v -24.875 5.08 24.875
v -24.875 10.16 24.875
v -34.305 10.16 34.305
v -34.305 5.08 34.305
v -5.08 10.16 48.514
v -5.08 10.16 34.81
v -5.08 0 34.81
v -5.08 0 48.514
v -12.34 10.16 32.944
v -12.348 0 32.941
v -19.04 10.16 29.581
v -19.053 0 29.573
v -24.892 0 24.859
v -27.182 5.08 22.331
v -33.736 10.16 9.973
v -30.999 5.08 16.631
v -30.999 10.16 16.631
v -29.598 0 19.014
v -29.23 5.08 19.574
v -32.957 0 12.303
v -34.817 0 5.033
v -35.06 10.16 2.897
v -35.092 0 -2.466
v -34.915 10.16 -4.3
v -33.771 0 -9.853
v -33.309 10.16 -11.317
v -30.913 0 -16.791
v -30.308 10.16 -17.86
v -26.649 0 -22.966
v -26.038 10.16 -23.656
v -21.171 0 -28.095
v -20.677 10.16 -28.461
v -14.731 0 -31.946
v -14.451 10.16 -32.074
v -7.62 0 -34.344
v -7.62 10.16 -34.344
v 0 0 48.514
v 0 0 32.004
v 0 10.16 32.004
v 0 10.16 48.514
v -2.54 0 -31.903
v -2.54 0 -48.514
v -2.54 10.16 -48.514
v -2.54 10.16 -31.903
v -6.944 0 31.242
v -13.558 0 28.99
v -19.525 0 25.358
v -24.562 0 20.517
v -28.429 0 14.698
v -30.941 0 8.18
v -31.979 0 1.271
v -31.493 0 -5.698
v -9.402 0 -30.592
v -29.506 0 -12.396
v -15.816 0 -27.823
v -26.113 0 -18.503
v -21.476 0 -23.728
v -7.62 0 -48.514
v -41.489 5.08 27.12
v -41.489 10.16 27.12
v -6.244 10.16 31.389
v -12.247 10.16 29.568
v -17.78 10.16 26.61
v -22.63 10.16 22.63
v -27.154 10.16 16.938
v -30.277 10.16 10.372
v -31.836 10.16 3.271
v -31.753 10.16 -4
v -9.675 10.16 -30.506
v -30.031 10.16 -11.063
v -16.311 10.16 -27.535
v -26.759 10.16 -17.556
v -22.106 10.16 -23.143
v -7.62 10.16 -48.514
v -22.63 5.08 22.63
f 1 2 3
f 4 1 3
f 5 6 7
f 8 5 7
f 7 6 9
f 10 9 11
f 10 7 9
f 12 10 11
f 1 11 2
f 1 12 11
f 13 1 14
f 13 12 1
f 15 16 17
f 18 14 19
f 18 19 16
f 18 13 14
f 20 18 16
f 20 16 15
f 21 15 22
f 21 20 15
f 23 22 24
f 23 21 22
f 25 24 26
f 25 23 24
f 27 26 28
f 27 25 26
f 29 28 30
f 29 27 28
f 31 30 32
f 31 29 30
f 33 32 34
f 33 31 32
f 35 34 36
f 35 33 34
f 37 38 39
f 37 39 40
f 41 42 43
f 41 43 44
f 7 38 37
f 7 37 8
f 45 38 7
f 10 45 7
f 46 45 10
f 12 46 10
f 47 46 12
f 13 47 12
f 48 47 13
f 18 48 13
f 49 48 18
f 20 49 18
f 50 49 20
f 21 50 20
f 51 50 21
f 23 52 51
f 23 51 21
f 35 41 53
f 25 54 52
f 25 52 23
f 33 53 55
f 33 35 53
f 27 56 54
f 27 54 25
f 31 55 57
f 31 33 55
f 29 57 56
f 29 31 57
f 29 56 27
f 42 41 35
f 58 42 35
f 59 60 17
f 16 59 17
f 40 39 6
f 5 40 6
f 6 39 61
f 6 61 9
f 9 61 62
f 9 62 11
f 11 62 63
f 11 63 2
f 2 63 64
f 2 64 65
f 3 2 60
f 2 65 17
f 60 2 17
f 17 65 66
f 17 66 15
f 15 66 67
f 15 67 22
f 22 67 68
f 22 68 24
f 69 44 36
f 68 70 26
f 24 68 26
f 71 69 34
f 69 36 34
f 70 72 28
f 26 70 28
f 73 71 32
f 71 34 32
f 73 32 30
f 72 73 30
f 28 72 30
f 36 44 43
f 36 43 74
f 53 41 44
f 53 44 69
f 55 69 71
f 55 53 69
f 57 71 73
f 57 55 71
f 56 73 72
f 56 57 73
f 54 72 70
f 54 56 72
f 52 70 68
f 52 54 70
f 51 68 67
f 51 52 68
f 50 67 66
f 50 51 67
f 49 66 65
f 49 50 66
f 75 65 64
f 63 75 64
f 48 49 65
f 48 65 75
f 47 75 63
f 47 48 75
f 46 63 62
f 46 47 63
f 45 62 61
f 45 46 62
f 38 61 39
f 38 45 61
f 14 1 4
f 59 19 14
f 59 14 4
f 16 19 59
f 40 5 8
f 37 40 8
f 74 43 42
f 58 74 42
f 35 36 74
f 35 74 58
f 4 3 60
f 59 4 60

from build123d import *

# Parameters (mm, degrees)
BOSS_EXTRUDE1_DEPTH = 10.16
SKETCH3_W           = 10.16
SKETCH3_H           = 5.08
BOSS_EXTRUDE2_DEPTH = 16.51
SKETCH4_W           = 10.16
SKETCH4_H           = 5.08
BOSS_EXTRUDE3_DEPTH = 16.51
BOSS_EXTRUDE4_DEPTH = 5.08


with BuildPart() as part:
    # Sketch1 → Boss-Extrude1 (new body)
    with BuildSketch(Plane(origin=(0, 0, 0), x_dir=(1, 0, 0), z_dir=(0, 1, 0))):
        with BuildLine():
            Line((0, -32.004), (0, -35.179))
            ThreePointArc((0, -35.179), (-35.156038364, -1.270829481), (-2.54, 35.087183429))
            Line((-2.54, 35.087183429), (-2.54, 31.903047127))
            ThreePointArc((-2.54, 31.903047127), (-31.978751823, -1.271002703), (0, -32.004))
        make_face()
    extrude(amount=BOSS_EXTRUDE1_DEPTH)

    # Sketch3 → Boss-Extrude2 (add)
    with BuildSketch(Plane(origin=(0, 0, 32.004), x_dir=(0, -1, 0), z_dir=(0, 0, -1))):
        with Locations((-5.08, 2.54)):
            Rectangle(SKETCH3_W, SKETCH3_H)
    extrude(amount=-BOSS_EXTRUDE2_DEPTH)

    # Sketch4 → Boss-Extrude3 (add)
    with BuildSketch(Plane(origin=(0, 0, -32.004), x_dir=(0, -1, 0), z_dir=(0, 0, 1))):
        with Locations((-5.08, -5.08)):
            Rectangle(SKETCH4_W, SKETCH4_H)
    extrude(amount=-BOSS_EXTRUDE3_DEPTH)

    # Sketch5 → Boss-Extrude4 (add)
    with BuildSketch(Plane(origin=(0, 10.16, 0), x_dir=(1, 0, 0), z_dir=(0, 1, 0))):
        Polygon((-22.630245425, -22.630245425), (-34.304578382, -34.304578382), (-41.488783279, -27.120373486), (-29.814450322, -15.446040528), align=None)
    extrude(amount=-BOSS_EXTRUDE4_DEPTH)


solid = part.part
